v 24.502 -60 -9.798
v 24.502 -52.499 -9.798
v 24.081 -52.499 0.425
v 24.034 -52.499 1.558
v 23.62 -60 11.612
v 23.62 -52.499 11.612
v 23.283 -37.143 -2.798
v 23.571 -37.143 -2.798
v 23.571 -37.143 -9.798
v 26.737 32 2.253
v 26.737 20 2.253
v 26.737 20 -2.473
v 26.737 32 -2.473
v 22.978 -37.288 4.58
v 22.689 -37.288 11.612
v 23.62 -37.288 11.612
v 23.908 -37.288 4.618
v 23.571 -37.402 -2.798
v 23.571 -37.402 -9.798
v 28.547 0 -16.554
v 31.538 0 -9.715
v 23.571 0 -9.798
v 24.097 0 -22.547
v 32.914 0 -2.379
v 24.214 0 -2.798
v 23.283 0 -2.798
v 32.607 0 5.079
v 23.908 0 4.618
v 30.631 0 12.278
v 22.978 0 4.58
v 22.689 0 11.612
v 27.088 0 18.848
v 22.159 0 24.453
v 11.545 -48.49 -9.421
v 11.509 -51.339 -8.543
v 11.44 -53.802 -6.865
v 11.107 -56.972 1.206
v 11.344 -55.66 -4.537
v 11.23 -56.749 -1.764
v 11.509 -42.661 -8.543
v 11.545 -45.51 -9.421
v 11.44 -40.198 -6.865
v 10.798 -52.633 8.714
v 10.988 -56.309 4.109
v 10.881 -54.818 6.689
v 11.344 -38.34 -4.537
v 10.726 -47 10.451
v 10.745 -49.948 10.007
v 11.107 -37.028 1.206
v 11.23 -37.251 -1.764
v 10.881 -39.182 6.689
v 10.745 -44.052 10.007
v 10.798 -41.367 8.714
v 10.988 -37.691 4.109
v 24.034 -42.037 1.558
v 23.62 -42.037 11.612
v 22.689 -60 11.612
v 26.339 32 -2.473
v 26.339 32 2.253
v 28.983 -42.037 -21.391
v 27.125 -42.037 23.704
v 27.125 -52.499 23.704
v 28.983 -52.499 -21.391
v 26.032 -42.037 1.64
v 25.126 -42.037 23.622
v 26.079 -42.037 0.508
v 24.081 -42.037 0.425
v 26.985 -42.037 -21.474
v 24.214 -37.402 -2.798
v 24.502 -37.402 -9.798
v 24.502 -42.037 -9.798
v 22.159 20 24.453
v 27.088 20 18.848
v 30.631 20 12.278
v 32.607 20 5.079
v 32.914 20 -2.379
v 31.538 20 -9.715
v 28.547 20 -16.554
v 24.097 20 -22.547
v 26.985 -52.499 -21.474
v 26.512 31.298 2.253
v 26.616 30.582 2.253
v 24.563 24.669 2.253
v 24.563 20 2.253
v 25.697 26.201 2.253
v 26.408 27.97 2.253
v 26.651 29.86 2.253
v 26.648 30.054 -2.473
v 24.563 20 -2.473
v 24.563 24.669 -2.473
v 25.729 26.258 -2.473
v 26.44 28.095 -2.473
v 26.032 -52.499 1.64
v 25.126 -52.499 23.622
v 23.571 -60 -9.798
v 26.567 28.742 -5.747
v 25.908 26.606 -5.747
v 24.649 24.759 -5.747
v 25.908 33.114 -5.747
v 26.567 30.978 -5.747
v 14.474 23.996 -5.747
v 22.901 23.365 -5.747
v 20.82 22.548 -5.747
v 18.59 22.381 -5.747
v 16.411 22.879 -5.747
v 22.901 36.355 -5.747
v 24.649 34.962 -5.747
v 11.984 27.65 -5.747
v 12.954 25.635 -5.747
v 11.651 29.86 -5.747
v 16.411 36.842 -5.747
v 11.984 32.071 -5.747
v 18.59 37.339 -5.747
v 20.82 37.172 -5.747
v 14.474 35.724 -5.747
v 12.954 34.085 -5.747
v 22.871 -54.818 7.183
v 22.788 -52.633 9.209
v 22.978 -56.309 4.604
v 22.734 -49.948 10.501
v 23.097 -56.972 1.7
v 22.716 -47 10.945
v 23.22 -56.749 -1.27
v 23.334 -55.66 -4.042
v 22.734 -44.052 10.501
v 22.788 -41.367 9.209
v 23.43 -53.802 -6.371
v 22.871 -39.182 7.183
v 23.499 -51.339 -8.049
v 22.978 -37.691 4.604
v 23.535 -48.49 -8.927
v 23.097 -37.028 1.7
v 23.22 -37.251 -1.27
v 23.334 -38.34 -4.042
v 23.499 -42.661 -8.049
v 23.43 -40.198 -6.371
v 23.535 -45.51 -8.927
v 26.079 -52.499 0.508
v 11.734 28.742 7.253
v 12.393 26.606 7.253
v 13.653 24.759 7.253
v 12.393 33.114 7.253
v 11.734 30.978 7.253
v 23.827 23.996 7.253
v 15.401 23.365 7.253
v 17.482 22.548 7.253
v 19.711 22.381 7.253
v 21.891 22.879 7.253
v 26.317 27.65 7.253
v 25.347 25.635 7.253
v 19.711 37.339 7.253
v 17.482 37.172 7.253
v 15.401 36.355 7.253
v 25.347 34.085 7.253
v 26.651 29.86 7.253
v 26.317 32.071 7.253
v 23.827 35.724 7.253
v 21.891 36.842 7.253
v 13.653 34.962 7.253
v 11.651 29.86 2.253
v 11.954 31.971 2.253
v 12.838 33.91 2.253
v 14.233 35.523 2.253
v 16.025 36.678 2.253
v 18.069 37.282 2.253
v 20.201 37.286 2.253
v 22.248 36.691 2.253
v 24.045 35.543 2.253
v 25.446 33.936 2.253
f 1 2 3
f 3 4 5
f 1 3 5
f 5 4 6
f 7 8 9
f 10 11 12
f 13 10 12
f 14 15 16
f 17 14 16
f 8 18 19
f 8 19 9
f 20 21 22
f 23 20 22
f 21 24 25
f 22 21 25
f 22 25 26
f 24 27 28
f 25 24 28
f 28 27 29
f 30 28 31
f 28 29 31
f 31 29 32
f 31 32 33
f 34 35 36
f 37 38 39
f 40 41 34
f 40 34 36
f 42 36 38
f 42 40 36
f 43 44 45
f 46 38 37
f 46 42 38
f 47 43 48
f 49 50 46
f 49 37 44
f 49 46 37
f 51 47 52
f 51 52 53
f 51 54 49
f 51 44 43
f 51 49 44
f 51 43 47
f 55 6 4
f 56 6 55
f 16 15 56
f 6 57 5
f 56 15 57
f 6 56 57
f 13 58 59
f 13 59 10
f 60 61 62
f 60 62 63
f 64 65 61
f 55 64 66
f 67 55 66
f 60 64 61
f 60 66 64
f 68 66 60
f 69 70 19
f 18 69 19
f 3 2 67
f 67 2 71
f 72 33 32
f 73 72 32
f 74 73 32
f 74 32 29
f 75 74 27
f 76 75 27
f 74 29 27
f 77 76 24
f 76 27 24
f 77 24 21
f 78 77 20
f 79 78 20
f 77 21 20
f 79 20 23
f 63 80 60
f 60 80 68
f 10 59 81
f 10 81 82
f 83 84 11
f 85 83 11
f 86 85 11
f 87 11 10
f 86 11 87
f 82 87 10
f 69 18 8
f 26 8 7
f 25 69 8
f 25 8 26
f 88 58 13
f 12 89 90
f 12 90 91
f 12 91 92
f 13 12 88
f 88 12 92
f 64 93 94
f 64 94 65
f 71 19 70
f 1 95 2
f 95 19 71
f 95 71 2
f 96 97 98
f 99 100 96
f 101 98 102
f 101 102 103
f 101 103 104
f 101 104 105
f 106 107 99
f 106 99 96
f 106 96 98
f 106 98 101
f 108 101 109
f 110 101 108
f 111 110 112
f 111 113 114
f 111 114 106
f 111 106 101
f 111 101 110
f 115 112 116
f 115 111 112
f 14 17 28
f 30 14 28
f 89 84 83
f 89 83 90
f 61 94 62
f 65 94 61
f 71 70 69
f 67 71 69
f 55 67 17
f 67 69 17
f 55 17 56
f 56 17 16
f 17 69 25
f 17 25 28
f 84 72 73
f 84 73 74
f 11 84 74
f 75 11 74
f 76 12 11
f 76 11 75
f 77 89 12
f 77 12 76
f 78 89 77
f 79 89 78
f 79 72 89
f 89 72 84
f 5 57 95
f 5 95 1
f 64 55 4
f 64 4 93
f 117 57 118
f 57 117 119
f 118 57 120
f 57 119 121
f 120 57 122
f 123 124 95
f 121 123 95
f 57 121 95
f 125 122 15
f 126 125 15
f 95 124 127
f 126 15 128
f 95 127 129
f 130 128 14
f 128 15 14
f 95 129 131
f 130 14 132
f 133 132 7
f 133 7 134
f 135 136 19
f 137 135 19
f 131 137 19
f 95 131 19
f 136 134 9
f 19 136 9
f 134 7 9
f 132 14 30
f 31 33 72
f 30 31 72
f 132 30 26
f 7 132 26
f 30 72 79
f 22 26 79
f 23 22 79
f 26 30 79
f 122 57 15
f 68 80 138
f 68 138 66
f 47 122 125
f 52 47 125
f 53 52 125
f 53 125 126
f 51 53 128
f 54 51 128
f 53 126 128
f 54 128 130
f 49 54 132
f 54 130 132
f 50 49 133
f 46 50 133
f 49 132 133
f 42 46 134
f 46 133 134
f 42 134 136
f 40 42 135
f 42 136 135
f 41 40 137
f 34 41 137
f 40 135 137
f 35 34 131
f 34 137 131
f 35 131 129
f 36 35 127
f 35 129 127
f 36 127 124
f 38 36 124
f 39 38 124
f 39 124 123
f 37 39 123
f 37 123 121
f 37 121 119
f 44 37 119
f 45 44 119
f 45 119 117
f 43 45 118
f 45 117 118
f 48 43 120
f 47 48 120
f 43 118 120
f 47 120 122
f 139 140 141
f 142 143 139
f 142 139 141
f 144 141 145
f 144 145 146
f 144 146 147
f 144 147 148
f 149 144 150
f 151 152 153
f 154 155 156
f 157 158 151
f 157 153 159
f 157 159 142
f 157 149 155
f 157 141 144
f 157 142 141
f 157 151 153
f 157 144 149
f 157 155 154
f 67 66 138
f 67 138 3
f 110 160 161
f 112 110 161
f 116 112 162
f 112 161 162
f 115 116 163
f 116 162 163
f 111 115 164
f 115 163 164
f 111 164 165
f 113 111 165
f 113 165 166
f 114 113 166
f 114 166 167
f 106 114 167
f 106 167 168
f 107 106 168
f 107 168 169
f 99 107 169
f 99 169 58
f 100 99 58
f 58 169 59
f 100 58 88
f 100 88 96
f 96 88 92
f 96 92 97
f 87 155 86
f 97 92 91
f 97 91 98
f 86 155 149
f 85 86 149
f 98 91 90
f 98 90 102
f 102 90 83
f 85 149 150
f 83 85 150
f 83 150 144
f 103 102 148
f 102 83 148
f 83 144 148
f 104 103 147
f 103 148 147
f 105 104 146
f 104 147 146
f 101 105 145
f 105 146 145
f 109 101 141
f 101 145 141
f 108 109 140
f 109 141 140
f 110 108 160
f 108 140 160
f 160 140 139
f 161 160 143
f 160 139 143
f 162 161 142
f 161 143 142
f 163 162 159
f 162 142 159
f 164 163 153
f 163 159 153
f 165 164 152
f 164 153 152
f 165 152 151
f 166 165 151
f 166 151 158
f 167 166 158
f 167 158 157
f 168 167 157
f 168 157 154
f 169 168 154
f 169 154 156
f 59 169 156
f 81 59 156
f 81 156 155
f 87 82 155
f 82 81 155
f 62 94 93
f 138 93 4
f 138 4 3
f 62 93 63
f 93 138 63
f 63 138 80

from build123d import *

# Parameters (mm, degrees)
BOSS_EXTRUDE1_DEPTH  = 20
BOSS_EXTRUDE2_DEPTH  = 60
SKETCH3_R            = 10
BOSS_EXTRUDE3_DEPTH  = 12
SKETCH6_R            = 1.5
BOSS_EXTRUDE4_DEPTH  = 3
SKETCH7_W            = 45.133553402
SKETCH7_H            = 10.461726886
BOSS_EXTRUDE5_DEPTH  = 4
SKETCH9_W            = 2
SKETCH9_H            = 10.461726886
CUT_EXTRUDE2_DEPTH   = 22
SKETCH10_W           = 2
SKETCH10_H           = 10.461726886
CUT_EXTRUDE3_DEPTH   = 22
CUT_EXTRUDE7_DEPTH   = 60
CUT_EXTRUDE8_DEPTH   = 60
SKETCH20_W           = 0.930986134
SKETCH20_H           = 37.401550855
CUT_EXTRUDE9_DEPTH   = 7
SKETCH21_W           = 7
SKETCH21_H           = 37.143096713
CUT_EXTRUDE10_DEPTH  = 7
SKETCH24_W           = 7
SKETCH24_H           = 37.288200147
CUT_EXTRUDE11_DEPTH  = 7
SKETCH25_W           = 0.930986134
SKETCH25_H           = 37.288200147
CUT_EXTRUDE12_DEPTH  = 7
SKETCH31_W           = 2.173787646
SKETCH31_H           = 4.725625318
BOSS_EXTRUDE8_DEPTH  = 12
SKETCH32_R           = 7.5
BOSS_EXTRUDE12_DEPTH = 5
SKETCH35_R           = 7.5
BOSS_EXTRUDE14_DEPTH = 8


with BuildPart() as part:
    # Sketch1 → Boss-Extrude1 (new body)
    with BuildSketch(Plane(origin=(0, 0, 0), x_dir=(1, 0, 0), z_dir=(0, 1, 0))):
        with BuildLine():
            Line((24.096630412, 22.546671656), (22.159303529, -24.453328344))
            ThreePointArc((22.159303529, -24.453328344), (32.972001095, -1.359096683), (24.096630412, 22.546671656))
        make_face()
    extrude(amount=BOSS_EXTRUDE1_DEPTH)

    # Sketch2 → Boss-Extrude2 (add)
    with BuildSketch(Plane.XZ):
        with BuildLine():
            Line((22.159303529, 24.453328344), (24.096630412, -22.546671656))
            ThreePointArc((24.096630412, -22.546671656), (24.546704066, -22.055822802), (24.986780993, -21.55599164))
            Line((24.986780993, -21.55599164), (23.127966971, 23.539268124))
            ThreePointArc((23.127966971, 23.539268124), (22.648247037, 24.001185515), (22.159303529, 24.453328344))
        make_face()
    extrude(amount=BOSS_EXTRUDE2_DEPTH)

    # Sketch3 → Boss-Extrude3 (add)
    with BuildSketch(Plane(origin=(23.127966971, 0, 0.953328344), x_dir=(-0.041184748, 0, 0.999151548), z_dir=(-0.999151548, 0, -0.041184748))):
        with Locations((0, -47)):
            Circle(SKETCH3_R)
    extrude(amount=BOSS_EXTRUDE3_DEPTH)

    # Sketch6 → Boss-Extrude4 (add)
    with BuildSketch(Plane(origin=(24.057373982, 0, 0.991638242), x_dir=(0.041184748, 0, -0.999151548), z_dir=(0.999151548, 0, 0.041184748))):
        with Locations((0, -47)):
            Circle(SKETCH6_R)
    extrude(amount=BOSS_EXTRUDE4_DEPTH)

    # Sketch7 → Boss-Extrude5 (add)
    with BuildSketch(Plane(origin=(24.057373982, 0, 0.991638242), x_dir=(0.041184748, 0, -0.999151548), z_dir=(0.999151548, 0, 0.041184748))):
        with Locations((0, -47.268051565)):
            Rectangle(SKETCH7_W, SKETCH7_H)
    extrude(amount=BOSS_EXTRUDE5_DEPTH)

    # Sketch9 → Cut-Extrude2 (cut)
    with BuildSketch(Plane(origin=(-0.929407011, 0, 22.547629882), x_dir=(0.999151548, 0, 0.041184748), z_dir=(-0.041184748, 0, 0.999151548))):
        with Locations((25.077802834, -47.268051565)):
            Rectangle(SKETCH9_W, SKETCH9_H)
    extrude(amount=-CUT_EXTRUDE2_DEPTH, mode=Mode.SUBTRACT)

    # Sketch10 → Cut-Extrude3 (cut)
    with BuildSketch(Plane(origin=(0.929407011, 0, -22.547629882), x_dir=(-0.999151548, 0, -0.041184748), z_dir=(0.041184748, 0, -0.999151548))):
        with Locations((-25.077802834, -47.268051565)):
            Rectangle(SKETCH10_W, SKETCH10_H)
    extrude(amount=-CUT_EXTRUDE3_DEPTH, mode=Mode.SUBTRACT)

    # Sketch16 → Cut-Extrude7 (cut)
    with BuildSketch(Plane.XZ.offset(60)):
        with BuildLine():
            Line((22.159303529, 24.453328344), (22.688611434, 11.612195682))
            Line((22.688611434, 11.612195682), (23.619597568, 11.612195682))
            Line((23.619597568, 11.612195682), (23.127966971, 23.539268124))
            ThreePointArc((23.127966971, 23.539268124), (22.648247037, 24.001185515), (22.159303529, 24.453328344))
        make_face()
    extrude(amount=-CUT_EXTRUDE7_DEPTH, mode=Mode.SUBTRACT)

    # Sketch19 → Cut-Extrude8 (cut)
    with BuildSketch(Plane.XZ.offset(60)):
        with BuildLine():
            Line((23.571126961, -9.797835906), (24.502113095, -9.797835906))
            Line((24.502113095, -9.797835906), (24.986780993, -21.55599164))
            ThreePointArc((24.986780993, -21.55599164), (24.546704066, -22.055822802), (24.096630412, -22.546671656))
            Line((24.096630412, -22.546671656), (23.571126961, -9.797835906))
        make_face()
    extrude(amount=-CUT_EXTRUDE8_DEPTH, mode=Mode.SUBTRACT)

    # Sketch20 → Cut-Extrude9 (cut)
    with BuildSketch(Plane(origin=(0, 0, -9.797835906), x_dir=(-1, 0, 0), z_dir=(0, 0, -1))):
        with Locations((-24.036620028, -18.700775428)):
            Rectangle(SKETCH20_W, SKETCH20_H)
    extrude(amount=-CUT_EXTRUDE9_DEPTH, mode=Mode.SUBTRACT)

    # Sketch21 → Cut-Extrude10 (cut)
    with BuildSketch(Plane(origin=(23.571126961, 0, 0), x_dir=(0, 0, -1), z_dir=(1, 0, 0))):
        with Locations((6.297835906, -18.571548357)):
            Rectangle(SKETCH21_W, SKETCH21_H)
    extrude(amount=-CUT_EXTRUDE10_DEPTH, mode=Mode.SUBTRACT)

    # Sketch24 → Cut-Extrude11 (cut)
    with BuildSketch(Plane(origin=(24.057373982, 0, 0.991638242), x_dir=(0.041184748, 0, -0.999151548), z_dir=(0.999151548, 0, 0.041184748))):
        with Locations((-7.129576122, -18.644100074)):
            Rectangle(SKETCH24_W, SKETCH24_H)
    extrude(amount=-CUT_EXTRUDE11_DEPTH, mode=Mode.SUBTRACT)

    # Sketch25 → Cut-Extrude12 (cut)
    with BuildSketch(Plane.XY.offset(11.612195682)):
        with Locations((23.154104501, -18.644100074)):
            Rectangle(SKETCH25_W, SKETCH25_H)
    extrude(amount=-CUT_EXTRUDE12_DEPTH, mode=Mode.SUBTRACT)

    # Sketch31 → Boss-Extrude8 (add)
    with BuildSketch(Plane(origin=(0, 20, 0), x_dir=(1, 0, 0), z_dir=(0, 1, 0))):
        with Locations((25.650353258, 0.109937353)):
            Rectangle(SKETCH31_W, SKETCH31_H)
    extrude(amount=BOSS_EXTRUDE8_DEPTH)

    # Sketch32 → Boss-Extrude12 (add)
    with BuildSketch(Plane.XY.offset(2.252875306)):
        with Locations((19.150620534, 29.860210164)):
            Circle(SKETCH32_R)
    extrude(amount=BOSS_EXTRUDE12_DEPTH)

    # Sketch35 → Boss-Extrude14 (add)
    with BuildSketch(Plane(origin=(0, 0, 2.252875306), x_dir=(-1, 0, 0), z_dir=(0, 0, -1))):
        with Locations((-19.150620534, 29.860210164)):
            Circle(SKETCH35_R)
    extrude(amount=BOSS_EXTRUDE14_DEPTH)


solid = part.part
